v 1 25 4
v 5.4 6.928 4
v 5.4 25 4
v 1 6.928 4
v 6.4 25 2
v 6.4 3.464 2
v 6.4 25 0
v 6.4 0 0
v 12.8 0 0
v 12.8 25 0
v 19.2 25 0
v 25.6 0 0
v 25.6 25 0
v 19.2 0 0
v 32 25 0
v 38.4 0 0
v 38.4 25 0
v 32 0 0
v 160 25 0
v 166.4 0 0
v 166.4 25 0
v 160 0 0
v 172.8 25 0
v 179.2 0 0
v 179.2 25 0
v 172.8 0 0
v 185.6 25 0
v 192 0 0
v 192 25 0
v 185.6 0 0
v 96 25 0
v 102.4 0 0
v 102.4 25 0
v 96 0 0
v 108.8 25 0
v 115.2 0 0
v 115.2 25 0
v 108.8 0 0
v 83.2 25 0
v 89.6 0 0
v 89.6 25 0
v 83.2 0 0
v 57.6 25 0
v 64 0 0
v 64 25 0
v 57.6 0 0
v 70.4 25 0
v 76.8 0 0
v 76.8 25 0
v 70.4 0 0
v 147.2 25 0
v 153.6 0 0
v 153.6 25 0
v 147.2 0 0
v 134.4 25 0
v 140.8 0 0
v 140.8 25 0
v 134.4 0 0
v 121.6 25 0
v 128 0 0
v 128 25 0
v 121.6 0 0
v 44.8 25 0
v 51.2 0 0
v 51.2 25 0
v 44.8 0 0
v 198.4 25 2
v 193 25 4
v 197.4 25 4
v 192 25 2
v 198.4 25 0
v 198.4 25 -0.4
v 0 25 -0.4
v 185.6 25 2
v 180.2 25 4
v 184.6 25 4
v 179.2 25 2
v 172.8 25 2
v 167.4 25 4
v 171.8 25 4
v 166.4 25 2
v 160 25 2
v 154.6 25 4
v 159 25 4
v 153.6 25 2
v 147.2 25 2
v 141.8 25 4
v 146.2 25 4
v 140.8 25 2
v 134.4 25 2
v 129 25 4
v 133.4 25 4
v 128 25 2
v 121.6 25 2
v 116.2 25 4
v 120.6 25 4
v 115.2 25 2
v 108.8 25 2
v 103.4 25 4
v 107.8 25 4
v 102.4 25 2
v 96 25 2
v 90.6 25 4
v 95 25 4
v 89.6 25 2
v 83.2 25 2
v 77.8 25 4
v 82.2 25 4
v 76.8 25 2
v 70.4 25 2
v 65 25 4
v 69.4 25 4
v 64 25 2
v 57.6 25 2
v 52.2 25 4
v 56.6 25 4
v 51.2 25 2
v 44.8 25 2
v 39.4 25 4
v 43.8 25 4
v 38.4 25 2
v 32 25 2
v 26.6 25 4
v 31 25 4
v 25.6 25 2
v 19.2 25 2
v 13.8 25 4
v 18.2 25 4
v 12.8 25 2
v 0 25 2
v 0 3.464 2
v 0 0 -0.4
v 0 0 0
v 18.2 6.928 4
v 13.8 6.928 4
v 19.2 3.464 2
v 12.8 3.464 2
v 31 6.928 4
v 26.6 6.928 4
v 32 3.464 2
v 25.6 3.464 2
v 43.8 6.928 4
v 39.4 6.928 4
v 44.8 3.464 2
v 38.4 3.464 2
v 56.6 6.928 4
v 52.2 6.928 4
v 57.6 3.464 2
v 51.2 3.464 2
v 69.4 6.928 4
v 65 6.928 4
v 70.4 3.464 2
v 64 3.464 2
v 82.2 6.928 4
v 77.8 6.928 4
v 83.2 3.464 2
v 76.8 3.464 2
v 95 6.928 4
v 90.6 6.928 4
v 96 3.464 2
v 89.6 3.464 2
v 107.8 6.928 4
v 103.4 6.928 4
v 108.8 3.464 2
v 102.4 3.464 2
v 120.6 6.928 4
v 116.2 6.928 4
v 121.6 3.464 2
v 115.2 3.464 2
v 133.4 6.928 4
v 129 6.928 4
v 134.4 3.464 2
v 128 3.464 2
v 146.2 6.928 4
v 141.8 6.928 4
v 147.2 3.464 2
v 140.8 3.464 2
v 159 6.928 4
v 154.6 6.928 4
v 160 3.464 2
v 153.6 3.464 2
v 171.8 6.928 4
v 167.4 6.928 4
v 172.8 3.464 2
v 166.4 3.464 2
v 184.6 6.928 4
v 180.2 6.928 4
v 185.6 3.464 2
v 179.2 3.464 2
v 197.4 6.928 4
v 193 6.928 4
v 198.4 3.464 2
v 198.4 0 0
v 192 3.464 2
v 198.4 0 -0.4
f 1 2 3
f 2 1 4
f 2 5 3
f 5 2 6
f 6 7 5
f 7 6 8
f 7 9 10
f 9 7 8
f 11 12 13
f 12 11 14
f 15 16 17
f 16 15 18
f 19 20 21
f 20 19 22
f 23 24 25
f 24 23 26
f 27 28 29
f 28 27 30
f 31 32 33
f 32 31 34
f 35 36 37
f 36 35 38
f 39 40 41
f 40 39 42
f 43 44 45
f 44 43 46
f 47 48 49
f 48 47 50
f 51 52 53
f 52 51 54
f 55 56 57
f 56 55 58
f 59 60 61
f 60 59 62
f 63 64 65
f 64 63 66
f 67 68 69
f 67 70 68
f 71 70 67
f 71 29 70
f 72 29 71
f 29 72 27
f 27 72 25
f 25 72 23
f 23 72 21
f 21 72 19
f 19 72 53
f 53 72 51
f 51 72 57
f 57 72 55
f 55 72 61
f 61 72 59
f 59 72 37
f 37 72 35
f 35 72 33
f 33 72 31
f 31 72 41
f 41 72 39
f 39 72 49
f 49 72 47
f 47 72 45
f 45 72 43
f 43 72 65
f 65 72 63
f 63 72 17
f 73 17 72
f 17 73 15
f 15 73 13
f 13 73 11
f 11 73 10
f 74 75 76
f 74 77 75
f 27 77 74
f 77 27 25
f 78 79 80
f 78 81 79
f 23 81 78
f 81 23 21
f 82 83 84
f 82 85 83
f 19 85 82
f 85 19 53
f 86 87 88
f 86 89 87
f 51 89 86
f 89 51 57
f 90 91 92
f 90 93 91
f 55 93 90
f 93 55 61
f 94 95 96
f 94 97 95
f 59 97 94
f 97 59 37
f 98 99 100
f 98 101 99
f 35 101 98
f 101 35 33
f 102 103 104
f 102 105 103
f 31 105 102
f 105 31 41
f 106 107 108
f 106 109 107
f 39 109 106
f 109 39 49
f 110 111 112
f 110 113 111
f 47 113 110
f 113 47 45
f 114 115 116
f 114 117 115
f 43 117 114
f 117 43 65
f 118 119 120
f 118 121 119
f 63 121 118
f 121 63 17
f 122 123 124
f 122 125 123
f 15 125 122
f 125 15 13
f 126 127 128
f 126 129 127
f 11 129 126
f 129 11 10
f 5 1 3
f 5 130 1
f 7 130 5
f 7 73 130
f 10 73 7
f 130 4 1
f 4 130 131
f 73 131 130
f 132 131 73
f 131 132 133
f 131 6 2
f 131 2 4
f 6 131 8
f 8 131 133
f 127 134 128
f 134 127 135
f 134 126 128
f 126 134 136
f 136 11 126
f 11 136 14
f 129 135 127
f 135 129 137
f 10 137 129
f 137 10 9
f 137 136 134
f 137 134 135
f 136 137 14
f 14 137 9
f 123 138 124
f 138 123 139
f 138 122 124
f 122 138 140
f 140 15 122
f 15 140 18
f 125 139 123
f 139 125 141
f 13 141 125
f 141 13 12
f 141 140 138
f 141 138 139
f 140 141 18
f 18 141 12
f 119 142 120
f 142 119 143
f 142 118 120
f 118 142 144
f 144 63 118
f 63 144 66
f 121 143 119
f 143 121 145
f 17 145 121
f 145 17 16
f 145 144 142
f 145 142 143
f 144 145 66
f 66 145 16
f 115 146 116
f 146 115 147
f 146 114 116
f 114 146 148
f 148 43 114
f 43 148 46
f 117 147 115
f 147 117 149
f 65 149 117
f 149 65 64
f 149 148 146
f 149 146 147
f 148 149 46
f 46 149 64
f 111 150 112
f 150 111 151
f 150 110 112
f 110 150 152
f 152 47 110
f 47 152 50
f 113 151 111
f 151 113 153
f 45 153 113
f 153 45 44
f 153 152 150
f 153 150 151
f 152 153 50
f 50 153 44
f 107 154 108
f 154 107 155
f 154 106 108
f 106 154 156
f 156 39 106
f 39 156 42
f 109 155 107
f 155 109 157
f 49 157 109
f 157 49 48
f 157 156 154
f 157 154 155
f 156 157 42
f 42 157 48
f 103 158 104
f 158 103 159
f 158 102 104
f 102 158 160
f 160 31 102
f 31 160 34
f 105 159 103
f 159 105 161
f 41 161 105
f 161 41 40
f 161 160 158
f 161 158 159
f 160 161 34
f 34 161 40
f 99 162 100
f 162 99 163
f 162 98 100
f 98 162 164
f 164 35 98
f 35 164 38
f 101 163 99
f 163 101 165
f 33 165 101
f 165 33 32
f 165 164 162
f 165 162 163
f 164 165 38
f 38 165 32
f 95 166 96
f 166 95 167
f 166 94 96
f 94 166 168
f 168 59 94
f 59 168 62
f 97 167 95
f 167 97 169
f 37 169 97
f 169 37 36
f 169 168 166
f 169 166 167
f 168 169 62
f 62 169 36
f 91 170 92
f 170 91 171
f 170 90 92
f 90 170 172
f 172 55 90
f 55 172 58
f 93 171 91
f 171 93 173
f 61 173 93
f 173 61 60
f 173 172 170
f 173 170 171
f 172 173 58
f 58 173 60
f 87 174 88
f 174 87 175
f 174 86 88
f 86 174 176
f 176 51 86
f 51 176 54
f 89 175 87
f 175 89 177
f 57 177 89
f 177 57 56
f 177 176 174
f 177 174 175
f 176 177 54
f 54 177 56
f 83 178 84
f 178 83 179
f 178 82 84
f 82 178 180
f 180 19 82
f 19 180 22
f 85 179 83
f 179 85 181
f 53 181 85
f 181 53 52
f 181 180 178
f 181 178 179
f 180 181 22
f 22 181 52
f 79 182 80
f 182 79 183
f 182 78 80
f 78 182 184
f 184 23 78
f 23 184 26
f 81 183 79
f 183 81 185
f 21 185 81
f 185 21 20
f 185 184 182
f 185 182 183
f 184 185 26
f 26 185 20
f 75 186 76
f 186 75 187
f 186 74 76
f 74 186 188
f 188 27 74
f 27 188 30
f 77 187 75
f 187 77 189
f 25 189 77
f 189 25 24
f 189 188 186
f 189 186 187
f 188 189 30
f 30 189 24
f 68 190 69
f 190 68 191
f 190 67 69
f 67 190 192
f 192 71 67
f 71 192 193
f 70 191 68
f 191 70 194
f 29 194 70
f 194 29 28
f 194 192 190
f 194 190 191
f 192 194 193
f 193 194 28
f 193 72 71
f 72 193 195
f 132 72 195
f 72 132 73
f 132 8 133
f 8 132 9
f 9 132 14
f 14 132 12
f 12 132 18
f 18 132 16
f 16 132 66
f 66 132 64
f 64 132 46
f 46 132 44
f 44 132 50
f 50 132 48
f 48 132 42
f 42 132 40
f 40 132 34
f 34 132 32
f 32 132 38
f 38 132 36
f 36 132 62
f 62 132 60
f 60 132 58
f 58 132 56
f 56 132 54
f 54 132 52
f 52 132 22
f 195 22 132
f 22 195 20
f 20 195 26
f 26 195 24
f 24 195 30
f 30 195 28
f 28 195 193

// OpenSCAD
//    |<-A->|
//     _____       _______
//    |     |<-C->|     ||
//    |     |     |     |B
//    |     |     |     ||
// ---       -----       ---

// Width of divider in mm
A = 6.4;
// Depth of divider in mm
B = 4;
// Distance between dividers (material thickness) in mm
C = 6.4; // Distance between dividers (material thickness)
 
// Total height of binning strip in mm
H = 25;
// Thickness of 'Tape' holding diviers together in mm
T = 0.4;
// Total number of dividers
N = 16;
// Cutoff angle
P = 30;

//    __________|a| 
//    |   /     \ |
//    b  /       \|
//    |_/         \
//      |         |
//      |         |
//      |         |
// -----           ------          

// rise of divider chamfer in mm
b = 2;
// run of divider chamfer slope in mm
a = 1;

// generate the tape
translate([0,0,-T]) cube([(N)*(A+C)-C,H,T]);

//generate the dividers
for(i=[0:1:N-1])
    translate([i*(A+C),0,0]) divider_element(H, A, B, b, a, P);

// module to make the divider shape
module divider_element(height, width, depth, rise, run, angle){
    difference(){
        translate ([0,height,0]) rotate([90,0,0]) linear_extrude(height, center = false, convexity = 10, twist = 0){
            polygon([[0,0],[0,depth-rise],[run,depth],[width-run,depth],[width,depth-rise],[width,0],[0,0]]);
        }
        // cutoff the top
        rotate([angle,0,0]) cube([width,height,depth]);    
    }
}
